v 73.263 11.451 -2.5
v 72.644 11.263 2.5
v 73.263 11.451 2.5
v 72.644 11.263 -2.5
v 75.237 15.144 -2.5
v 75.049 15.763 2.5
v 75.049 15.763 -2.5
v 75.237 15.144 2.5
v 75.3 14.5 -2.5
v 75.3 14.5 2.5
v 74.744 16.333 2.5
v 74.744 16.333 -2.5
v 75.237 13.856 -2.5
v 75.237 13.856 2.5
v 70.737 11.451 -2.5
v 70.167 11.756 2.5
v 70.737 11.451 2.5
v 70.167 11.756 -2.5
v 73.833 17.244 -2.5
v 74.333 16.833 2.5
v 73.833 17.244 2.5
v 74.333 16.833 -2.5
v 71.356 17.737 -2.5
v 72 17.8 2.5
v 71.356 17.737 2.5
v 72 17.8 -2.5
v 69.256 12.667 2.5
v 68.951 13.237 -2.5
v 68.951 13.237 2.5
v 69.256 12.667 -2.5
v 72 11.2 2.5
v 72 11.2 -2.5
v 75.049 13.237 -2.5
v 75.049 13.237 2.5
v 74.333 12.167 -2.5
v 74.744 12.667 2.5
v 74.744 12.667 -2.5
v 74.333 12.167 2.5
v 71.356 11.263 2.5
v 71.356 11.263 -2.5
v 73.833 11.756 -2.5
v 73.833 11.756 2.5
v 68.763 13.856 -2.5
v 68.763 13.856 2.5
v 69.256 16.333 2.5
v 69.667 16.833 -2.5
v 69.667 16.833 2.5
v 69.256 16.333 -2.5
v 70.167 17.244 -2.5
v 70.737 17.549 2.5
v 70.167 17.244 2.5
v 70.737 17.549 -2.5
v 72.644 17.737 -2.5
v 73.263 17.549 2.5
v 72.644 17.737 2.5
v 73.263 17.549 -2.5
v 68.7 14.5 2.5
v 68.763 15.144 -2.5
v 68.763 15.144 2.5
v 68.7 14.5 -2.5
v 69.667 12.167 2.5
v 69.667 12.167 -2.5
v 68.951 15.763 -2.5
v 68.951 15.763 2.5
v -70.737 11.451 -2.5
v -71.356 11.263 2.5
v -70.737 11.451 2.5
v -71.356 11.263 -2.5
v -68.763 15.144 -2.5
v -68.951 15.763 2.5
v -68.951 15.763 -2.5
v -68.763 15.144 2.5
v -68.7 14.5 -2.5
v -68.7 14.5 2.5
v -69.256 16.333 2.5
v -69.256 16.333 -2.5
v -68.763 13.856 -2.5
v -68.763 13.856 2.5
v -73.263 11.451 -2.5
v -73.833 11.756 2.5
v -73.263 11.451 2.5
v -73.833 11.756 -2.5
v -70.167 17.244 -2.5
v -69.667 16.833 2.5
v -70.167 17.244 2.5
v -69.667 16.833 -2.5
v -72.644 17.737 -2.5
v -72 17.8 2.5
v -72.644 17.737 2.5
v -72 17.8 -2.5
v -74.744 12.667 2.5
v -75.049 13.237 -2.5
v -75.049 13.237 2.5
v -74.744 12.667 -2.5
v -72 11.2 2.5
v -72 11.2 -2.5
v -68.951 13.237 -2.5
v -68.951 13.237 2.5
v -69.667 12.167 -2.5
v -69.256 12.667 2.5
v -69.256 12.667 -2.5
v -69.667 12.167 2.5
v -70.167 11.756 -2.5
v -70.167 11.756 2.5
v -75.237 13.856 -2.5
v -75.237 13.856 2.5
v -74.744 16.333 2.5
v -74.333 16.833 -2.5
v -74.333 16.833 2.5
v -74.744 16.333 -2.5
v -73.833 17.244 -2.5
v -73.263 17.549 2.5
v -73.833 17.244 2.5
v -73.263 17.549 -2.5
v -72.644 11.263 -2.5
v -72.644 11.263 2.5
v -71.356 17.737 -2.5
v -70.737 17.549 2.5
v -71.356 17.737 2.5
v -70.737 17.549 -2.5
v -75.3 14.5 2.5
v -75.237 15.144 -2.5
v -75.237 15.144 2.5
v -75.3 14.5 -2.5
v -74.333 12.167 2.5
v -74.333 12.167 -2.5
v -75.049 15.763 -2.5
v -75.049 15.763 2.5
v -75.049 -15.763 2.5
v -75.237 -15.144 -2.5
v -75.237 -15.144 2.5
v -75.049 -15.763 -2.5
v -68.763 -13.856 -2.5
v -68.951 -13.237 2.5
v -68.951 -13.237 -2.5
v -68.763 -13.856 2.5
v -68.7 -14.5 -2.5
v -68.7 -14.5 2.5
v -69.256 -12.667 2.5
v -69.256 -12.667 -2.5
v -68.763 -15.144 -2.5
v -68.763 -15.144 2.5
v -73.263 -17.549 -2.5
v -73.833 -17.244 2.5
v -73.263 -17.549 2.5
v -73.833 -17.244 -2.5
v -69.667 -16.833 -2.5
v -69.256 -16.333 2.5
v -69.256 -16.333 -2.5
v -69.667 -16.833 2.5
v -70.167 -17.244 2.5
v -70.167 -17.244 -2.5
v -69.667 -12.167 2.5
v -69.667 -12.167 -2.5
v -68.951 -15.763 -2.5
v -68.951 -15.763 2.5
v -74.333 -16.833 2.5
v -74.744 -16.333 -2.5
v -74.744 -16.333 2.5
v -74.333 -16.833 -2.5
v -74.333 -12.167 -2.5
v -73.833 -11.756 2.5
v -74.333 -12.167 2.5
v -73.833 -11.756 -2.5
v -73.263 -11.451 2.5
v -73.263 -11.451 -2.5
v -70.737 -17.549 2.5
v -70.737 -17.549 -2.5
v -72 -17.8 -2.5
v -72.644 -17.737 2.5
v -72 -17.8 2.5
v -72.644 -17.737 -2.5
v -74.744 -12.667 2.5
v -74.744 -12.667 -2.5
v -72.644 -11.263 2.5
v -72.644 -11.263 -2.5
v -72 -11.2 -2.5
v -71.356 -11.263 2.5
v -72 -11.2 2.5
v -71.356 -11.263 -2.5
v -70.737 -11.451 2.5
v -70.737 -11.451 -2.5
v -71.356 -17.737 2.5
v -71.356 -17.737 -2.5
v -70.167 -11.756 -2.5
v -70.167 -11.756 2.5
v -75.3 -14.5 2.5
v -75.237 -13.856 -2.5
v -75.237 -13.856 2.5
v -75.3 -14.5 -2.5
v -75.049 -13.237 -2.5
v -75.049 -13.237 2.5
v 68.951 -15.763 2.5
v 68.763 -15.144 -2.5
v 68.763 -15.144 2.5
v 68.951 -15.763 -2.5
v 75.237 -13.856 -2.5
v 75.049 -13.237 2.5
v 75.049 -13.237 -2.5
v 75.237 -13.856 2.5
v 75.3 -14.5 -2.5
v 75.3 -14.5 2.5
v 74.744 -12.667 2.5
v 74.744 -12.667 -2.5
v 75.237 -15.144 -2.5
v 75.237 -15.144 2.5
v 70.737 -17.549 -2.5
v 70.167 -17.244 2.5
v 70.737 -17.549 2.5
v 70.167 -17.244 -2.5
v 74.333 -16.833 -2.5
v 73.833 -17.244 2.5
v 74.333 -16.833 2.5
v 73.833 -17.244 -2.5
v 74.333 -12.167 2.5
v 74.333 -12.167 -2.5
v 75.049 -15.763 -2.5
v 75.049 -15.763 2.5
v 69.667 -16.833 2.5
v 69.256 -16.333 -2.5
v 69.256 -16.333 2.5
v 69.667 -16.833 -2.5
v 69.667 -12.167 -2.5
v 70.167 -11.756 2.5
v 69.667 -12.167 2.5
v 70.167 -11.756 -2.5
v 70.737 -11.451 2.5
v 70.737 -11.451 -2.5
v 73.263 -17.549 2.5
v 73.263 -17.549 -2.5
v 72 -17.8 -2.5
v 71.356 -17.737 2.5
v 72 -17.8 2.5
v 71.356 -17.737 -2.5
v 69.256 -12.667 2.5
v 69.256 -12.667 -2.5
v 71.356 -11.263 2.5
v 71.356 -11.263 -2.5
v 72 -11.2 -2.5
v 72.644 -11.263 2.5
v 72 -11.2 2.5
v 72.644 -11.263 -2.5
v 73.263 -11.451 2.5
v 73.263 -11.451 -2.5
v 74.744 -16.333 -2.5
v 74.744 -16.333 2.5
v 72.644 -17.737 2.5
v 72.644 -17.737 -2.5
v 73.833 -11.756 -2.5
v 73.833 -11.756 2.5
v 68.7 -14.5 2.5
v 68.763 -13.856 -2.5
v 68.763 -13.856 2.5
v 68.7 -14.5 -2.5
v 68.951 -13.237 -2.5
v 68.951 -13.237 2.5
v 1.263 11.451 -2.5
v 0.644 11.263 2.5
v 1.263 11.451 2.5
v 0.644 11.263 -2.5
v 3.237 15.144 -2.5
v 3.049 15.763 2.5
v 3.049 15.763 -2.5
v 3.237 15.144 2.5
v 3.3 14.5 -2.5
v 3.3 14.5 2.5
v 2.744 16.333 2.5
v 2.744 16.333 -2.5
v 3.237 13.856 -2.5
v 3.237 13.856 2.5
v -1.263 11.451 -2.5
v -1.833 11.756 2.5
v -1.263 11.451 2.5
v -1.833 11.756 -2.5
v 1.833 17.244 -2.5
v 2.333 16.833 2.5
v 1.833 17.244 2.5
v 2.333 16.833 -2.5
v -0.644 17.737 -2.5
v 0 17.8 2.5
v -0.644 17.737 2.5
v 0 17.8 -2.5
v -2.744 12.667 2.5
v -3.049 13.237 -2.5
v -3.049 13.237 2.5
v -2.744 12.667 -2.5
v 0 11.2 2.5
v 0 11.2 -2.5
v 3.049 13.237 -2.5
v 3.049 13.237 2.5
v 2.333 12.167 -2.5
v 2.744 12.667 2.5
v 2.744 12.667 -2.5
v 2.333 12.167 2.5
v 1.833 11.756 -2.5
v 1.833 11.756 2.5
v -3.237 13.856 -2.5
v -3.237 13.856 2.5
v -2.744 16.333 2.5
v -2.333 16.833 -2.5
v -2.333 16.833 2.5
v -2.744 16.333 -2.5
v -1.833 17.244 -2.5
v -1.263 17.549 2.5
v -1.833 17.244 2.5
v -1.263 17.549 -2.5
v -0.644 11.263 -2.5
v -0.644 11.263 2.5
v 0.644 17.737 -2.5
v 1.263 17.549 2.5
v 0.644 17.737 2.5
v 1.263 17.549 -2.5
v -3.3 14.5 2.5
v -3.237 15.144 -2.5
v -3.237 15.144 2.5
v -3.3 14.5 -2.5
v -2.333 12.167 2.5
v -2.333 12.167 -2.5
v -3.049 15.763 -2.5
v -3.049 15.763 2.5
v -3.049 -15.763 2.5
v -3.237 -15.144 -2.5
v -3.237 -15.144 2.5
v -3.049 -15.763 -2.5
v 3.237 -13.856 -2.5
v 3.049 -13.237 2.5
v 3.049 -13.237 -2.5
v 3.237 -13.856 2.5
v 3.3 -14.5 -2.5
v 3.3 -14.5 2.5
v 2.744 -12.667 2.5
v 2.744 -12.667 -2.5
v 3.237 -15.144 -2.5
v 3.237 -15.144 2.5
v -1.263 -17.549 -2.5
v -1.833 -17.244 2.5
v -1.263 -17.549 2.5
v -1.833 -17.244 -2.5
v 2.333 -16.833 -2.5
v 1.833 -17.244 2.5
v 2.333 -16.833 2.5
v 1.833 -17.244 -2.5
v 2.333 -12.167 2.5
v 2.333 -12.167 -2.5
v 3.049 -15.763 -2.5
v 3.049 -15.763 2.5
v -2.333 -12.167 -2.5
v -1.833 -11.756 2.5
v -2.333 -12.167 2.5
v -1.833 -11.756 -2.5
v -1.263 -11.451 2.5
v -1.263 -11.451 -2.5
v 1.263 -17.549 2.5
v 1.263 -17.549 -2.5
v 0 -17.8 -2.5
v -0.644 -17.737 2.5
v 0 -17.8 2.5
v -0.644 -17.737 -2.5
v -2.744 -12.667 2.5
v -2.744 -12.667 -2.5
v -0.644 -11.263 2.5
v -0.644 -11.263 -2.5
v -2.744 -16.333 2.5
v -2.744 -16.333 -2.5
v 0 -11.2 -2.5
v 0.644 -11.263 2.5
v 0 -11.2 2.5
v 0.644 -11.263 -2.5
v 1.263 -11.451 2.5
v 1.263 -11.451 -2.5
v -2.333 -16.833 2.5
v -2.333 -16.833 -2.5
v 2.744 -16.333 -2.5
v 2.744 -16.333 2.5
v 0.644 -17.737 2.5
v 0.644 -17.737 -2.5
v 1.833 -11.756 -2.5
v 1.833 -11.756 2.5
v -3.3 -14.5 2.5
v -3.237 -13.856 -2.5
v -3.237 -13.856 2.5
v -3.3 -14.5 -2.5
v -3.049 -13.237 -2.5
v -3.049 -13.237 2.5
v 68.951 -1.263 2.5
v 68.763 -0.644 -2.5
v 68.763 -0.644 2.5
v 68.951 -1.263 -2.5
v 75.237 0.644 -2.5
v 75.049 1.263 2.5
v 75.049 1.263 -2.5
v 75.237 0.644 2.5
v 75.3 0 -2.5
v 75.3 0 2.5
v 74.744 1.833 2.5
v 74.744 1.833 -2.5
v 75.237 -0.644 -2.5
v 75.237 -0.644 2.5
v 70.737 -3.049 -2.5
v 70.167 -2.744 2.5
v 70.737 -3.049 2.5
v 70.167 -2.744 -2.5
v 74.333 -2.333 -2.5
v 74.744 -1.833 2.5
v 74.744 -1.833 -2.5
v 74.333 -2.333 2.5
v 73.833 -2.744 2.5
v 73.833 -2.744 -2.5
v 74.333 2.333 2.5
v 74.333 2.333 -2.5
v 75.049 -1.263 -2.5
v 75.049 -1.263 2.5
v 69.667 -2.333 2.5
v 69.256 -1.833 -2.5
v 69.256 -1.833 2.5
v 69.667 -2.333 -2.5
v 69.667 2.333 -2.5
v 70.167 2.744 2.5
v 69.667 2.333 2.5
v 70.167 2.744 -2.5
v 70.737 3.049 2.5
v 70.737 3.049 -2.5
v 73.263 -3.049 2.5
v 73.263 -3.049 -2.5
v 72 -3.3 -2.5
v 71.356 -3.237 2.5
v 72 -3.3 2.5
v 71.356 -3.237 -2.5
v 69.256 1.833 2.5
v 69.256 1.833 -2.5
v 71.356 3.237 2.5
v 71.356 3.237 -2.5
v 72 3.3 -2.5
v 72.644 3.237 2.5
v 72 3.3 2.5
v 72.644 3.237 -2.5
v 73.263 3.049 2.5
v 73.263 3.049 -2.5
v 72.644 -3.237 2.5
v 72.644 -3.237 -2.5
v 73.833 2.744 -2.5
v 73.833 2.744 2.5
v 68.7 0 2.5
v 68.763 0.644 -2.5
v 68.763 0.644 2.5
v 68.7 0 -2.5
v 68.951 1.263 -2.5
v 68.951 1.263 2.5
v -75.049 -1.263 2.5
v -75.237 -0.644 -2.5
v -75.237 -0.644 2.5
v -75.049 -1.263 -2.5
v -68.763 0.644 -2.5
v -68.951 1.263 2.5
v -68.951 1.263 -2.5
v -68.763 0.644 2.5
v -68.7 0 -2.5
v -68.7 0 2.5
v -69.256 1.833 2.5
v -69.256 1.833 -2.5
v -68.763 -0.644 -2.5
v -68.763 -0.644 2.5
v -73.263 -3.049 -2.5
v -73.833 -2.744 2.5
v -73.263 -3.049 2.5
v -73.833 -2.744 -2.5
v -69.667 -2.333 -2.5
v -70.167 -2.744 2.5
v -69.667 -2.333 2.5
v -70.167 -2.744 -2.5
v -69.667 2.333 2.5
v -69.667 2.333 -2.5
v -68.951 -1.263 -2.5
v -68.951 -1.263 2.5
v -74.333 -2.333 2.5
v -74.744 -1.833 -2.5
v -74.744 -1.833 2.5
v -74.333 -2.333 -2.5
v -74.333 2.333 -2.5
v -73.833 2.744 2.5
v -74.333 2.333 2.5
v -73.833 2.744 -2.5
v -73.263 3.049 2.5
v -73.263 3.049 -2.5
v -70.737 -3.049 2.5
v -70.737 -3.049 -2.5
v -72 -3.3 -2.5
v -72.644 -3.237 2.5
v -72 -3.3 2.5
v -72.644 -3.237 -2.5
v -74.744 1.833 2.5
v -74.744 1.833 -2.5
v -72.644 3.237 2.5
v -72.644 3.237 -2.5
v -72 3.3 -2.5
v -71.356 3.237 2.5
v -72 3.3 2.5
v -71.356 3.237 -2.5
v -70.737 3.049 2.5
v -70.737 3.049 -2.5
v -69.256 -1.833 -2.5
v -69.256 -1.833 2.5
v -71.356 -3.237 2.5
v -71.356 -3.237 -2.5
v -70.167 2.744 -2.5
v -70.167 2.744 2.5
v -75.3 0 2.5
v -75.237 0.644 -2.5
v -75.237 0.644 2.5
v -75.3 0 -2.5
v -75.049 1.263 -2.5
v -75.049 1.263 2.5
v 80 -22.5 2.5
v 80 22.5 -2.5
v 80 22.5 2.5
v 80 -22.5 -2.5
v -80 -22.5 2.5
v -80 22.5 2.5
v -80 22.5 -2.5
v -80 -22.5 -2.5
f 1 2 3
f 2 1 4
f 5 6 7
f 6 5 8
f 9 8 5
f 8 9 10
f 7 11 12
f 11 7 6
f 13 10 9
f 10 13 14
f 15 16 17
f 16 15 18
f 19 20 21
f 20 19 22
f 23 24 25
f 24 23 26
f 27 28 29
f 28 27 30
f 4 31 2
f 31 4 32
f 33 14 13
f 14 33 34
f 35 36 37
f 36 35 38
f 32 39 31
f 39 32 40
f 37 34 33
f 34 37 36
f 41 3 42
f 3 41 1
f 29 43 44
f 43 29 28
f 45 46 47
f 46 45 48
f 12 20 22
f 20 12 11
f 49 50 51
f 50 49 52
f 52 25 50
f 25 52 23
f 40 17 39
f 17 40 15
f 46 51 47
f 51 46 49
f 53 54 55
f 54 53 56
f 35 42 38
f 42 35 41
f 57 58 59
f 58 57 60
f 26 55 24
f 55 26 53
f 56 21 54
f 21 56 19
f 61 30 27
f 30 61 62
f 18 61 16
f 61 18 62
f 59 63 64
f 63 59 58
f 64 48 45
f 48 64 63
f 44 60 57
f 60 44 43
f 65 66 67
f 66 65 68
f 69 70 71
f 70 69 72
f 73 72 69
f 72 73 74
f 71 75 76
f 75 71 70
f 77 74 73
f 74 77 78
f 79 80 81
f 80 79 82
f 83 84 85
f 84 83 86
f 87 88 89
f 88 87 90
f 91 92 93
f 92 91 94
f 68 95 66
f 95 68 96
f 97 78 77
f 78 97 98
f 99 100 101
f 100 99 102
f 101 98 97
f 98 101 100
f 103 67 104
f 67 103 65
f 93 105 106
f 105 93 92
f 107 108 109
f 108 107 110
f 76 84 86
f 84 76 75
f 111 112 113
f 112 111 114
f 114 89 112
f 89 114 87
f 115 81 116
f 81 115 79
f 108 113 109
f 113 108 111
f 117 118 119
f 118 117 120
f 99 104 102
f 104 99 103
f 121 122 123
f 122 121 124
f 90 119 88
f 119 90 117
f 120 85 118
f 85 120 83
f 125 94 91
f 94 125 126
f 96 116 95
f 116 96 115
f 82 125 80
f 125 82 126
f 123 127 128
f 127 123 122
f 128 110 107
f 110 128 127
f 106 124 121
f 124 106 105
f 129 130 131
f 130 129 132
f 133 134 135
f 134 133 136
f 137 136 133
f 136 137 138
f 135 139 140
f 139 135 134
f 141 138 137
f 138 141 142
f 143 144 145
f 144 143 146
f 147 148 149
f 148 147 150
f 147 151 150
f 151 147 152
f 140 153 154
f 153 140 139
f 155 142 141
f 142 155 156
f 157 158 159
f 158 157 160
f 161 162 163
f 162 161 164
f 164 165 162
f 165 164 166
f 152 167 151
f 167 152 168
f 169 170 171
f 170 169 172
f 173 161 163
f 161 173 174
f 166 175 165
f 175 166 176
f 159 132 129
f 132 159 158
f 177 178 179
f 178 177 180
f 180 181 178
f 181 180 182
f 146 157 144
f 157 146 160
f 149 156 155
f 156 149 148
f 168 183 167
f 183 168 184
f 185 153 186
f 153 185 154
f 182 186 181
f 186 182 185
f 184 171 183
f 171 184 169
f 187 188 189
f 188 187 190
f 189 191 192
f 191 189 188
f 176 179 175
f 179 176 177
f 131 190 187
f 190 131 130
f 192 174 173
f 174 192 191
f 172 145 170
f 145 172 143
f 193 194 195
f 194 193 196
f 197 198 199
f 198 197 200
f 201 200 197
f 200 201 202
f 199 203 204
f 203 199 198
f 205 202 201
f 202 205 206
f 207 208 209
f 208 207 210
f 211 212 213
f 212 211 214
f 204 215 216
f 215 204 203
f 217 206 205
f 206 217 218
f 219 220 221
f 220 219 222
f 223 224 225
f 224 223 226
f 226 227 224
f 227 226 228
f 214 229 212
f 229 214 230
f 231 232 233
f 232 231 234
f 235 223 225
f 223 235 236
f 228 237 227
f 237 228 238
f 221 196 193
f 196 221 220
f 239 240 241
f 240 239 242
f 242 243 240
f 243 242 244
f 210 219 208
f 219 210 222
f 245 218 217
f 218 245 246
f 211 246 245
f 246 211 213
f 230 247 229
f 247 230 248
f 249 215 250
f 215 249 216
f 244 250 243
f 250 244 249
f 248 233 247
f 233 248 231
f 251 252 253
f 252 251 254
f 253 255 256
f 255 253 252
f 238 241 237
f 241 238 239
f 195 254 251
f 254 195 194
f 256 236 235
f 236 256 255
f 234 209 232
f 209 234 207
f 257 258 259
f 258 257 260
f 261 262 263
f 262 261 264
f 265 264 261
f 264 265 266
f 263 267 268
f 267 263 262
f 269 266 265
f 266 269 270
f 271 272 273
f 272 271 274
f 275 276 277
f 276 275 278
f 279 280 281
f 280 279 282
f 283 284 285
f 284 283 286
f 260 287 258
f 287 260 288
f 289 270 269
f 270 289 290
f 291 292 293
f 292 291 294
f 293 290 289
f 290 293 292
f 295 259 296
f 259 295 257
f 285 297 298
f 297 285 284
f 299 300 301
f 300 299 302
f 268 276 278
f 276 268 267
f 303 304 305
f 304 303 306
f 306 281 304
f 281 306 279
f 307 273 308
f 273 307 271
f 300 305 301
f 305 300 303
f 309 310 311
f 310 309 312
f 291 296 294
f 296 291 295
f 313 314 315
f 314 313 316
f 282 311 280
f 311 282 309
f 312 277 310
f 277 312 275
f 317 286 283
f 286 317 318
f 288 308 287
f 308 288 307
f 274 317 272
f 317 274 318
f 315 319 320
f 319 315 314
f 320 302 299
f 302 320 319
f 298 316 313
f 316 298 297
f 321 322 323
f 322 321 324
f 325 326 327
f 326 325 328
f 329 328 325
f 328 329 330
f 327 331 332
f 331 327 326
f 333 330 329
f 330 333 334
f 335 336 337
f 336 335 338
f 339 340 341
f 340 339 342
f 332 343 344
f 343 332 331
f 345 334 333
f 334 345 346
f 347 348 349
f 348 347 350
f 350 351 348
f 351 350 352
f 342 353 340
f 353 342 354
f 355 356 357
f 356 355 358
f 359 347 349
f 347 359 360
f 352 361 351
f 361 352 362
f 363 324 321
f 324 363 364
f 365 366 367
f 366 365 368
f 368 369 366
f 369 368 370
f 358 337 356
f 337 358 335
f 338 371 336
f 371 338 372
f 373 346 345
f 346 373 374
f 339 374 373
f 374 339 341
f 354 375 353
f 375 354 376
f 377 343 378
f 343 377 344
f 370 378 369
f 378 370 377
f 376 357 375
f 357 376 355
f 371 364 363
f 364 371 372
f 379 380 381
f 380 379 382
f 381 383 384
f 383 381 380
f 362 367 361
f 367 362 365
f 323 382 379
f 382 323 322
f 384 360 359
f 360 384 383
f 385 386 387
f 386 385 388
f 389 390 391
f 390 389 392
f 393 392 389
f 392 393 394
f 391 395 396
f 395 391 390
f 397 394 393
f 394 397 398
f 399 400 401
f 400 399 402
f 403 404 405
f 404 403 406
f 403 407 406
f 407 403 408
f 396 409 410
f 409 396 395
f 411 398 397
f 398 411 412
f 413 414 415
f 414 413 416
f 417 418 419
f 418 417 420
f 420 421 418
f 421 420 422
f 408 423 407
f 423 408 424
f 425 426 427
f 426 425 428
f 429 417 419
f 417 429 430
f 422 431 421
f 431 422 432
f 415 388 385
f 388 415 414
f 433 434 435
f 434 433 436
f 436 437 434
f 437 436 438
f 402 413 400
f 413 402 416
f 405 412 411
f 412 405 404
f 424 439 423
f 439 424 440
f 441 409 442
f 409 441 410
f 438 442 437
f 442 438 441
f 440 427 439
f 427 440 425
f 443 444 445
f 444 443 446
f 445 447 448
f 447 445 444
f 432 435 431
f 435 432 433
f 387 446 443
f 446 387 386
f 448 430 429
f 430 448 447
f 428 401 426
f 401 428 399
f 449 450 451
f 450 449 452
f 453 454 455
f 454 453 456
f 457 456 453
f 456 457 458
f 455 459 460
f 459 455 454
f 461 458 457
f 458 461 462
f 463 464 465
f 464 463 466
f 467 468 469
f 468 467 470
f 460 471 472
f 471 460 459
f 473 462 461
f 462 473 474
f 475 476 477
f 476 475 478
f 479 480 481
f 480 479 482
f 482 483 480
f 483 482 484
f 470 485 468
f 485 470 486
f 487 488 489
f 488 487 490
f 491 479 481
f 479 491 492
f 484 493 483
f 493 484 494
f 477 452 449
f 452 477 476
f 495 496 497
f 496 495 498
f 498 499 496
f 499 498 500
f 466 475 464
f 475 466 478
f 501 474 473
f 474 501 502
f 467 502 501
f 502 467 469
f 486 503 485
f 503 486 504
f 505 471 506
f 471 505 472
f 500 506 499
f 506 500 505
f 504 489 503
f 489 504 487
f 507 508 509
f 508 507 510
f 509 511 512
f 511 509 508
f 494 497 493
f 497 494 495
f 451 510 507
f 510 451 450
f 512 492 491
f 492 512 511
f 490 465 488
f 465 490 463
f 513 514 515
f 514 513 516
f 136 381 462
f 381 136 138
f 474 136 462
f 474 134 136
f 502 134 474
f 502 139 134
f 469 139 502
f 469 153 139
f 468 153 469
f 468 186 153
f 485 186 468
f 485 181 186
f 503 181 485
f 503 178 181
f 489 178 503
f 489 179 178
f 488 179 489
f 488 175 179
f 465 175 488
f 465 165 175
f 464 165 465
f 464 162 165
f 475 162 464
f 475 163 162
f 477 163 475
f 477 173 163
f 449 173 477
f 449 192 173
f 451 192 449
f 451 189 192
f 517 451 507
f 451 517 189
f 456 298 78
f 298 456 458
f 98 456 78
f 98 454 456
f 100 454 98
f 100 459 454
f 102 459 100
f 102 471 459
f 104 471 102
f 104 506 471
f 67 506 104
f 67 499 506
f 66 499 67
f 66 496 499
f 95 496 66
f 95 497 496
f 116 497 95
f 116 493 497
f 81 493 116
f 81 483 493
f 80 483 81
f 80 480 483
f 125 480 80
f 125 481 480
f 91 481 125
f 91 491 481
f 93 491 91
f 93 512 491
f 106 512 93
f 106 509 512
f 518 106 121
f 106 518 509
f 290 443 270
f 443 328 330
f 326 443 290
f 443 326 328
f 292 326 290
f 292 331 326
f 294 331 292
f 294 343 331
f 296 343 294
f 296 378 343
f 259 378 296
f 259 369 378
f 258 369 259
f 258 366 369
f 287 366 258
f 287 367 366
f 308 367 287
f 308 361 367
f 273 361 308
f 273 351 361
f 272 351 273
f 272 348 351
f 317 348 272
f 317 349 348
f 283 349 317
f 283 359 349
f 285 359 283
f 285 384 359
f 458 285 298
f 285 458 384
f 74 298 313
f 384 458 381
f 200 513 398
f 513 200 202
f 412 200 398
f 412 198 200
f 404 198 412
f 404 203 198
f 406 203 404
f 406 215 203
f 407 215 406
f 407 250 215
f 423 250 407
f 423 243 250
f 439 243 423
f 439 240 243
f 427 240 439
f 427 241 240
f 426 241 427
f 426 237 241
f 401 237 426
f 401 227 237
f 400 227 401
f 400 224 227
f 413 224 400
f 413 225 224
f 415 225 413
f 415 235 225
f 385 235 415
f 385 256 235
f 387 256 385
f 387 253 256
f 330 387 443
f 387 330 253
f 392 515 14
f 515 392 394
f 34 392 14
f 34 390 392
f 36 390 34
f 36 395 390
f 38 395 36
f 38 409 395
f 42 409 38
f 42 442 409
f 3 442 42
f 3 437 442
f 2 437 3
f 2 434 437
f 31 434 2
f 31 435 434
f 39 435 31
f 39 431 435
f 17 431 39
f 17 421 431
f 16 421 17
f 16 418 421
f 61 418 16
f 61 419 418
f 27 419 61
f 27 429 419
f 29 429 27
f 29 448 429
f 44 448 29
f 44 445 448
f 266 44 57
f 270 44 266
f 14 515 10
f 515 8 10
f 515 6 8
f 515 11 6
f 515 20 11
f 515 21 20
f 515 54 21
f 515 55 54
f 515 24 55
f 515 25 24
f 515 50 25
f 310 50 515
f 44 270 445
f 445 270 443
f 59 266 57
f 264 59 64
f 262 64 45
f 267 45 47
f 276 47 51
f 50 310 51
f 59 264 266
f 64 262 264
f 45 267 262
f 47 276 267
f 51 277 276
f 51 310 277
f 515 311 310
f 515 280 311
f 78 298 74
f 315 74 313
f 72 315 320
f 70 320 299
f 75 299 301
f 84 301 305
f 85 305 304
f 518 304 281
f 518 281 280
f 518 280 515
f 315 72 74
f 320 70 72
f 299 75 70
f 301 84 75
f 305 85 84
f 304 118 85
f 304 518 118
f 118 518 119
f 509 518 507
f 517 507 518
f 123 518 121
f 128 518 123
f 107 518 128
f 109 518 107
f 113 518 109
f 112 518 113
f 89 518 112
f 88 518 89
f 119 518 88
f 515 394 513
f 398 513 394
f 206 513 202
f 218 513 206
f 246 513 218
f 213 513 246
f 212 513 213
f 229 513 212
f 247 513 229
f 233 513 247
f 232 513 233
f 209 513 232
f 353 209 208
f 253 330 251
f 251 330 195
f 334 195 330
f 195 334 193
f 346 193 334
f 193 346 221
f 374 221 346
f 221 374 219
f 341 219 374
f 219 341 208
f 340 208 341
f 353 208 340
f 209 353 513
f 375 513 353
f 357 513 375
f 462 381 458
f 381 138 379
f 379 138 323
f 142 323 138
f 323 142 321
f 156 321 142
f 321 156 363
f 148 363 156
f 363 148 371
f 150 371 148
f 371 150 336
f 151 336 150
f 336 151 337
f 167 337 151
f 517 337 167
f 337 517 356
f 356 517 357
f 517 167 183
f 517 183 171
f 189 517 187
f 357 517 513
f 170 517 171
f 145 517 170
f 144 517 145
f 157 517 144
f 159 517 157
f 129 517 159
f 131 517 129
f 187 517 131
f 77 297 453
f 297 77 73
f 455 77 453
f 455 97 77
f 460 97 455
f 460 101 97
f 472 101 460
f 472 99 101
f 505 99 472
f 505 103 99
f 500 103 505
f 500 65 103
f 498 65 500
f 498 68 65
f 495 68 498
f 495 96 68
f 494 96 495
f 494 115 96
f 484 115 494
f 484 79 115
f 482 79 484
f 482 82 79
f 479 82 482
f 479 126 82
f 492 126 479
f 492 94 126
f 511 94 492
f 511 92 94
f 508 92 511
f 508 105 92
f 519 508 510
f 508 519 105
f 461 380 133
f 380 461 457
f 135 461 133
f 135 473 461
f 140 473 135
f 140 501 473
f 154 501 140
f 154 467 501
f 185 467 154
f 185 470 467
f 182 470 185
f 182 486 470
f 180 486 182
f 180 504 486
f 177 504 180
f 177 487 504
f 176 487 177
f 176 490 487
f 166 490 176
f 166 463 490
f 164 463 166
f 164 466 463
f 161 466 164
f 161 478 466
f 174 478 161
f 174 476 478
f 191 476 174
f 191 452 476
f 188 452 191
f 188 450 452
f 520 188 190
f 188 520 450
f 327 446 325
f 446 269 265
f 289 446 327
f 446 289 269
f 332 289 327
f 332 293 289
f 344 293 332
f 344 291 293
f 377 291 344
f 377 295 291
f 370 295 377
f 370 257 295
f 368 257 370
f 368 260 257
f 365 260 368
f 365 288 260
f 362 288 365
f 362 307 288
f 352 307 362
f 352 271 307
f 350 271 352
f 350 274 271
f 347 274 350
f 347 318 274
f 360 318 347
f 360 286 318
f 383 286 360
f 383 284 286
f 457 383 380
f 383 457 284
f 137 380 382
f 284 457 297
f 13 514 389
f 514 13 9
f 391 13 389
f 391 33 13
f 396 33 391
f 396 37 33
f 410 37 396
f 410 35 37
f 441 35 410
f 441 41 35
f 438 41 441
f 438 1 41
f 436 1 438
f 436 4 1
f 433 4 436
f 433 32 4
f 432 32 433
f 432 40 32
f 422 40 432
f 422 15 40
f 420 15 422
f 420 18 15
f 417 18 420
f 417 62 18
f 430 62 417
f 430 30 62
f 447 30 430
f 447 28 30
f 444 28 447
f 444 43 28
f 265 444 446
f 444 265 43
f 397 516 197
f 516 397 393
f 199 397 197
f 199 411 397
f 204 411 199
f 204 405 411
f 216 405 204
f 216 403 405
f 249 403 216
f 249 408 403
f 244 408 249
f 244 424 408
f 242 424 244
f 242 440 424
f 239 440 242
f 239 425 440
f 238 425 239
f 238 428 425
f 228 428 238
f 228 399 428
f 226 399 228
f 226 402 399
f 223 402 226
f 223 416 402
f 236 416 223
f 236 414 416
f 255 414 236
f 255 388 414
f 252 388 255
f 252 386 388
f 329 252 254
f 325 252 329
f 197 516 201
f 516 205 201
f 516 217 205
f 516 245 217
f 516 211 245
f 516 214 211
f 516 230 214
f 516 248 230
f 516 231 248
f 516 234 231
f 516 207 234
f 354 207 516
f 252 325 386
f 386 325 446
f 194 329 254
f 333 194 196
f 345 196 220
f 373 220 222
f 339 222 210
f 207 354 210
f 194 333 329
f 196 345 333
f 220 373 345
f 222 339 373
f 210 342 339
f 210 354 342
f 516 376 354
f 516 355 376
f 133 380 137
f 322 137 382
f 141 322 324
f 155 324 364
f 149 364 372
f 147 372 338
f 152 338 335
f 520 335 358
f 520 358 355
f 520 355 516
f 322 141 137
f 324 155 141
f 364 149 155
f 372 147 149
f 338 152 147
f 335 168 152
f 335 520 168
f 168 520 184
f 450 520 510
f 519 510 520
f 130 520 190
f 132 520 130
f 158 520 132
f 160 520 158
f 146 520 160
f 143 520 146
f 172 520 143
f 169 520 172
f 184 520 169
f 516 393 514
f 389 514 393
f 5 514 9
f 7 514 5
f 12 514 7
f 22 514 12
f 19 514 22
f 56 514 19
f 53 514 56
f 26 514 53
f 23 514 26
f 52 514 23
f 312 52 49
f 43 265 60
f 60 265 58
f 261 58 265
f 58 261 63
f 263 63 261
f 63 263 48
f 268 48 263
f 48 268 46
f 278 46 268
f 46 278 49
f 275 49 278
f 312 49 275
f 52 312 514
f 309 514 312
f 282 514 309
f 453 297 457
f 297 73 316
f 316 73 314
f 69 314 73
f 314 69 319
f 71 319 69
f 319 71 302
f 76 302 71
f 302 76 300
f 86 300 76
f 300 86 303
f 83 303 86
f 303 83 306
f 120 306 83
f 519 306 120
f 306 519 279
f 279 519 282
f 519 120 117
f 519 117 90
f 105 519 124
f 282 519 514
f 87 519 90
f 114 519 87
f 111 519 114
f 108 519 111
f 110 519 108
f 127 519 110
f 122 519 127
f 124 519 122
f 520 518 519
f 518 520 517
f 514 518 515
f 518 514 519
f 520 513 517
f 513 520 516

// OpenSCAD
$fn = 32;

// ----------------------------------------------------------------------
// Corner plate 160 x 45 x 5
// 8 holes, centres taken from the edge offset
// ----------------------------------------------------------------------

// --- parameters (mm) ---
plate = [160, 45, 5];  // overall size (x, y, z)
holes = 8;             // number of holes the drawing asks for
hole_d = 6.6;          // hole diameter
edge = 8;              // hole centre offset from the plate edge

// --- derived feature positions (mm) ---
corner_x = plate[0] / 2 - edge;  // = 72   corner hole X
corner_y = plate[1] / 2 - edge;  // = 14.5   corner hole Y
feature_centers = [
  [corner_x, corner_y],
  [-corner_x, corner_y],
  [-corner_x, -corner_y],
  [corner_x, -corner_y],
  [0, corner_y],
  [0, -corner_y],
  [corner_x, 0],
  [-corner_x, 0]
];   // hole centres the loop below drills

// plate outline, every hole drilled through with the same cutters
difference() {
  cube(plate, center = true);
  for (centre = feature_centers)
    translate([centre[0], centre[1], 0])
      cylinder(d = hole_d, h = plate[2] + 2, center = true);
}
